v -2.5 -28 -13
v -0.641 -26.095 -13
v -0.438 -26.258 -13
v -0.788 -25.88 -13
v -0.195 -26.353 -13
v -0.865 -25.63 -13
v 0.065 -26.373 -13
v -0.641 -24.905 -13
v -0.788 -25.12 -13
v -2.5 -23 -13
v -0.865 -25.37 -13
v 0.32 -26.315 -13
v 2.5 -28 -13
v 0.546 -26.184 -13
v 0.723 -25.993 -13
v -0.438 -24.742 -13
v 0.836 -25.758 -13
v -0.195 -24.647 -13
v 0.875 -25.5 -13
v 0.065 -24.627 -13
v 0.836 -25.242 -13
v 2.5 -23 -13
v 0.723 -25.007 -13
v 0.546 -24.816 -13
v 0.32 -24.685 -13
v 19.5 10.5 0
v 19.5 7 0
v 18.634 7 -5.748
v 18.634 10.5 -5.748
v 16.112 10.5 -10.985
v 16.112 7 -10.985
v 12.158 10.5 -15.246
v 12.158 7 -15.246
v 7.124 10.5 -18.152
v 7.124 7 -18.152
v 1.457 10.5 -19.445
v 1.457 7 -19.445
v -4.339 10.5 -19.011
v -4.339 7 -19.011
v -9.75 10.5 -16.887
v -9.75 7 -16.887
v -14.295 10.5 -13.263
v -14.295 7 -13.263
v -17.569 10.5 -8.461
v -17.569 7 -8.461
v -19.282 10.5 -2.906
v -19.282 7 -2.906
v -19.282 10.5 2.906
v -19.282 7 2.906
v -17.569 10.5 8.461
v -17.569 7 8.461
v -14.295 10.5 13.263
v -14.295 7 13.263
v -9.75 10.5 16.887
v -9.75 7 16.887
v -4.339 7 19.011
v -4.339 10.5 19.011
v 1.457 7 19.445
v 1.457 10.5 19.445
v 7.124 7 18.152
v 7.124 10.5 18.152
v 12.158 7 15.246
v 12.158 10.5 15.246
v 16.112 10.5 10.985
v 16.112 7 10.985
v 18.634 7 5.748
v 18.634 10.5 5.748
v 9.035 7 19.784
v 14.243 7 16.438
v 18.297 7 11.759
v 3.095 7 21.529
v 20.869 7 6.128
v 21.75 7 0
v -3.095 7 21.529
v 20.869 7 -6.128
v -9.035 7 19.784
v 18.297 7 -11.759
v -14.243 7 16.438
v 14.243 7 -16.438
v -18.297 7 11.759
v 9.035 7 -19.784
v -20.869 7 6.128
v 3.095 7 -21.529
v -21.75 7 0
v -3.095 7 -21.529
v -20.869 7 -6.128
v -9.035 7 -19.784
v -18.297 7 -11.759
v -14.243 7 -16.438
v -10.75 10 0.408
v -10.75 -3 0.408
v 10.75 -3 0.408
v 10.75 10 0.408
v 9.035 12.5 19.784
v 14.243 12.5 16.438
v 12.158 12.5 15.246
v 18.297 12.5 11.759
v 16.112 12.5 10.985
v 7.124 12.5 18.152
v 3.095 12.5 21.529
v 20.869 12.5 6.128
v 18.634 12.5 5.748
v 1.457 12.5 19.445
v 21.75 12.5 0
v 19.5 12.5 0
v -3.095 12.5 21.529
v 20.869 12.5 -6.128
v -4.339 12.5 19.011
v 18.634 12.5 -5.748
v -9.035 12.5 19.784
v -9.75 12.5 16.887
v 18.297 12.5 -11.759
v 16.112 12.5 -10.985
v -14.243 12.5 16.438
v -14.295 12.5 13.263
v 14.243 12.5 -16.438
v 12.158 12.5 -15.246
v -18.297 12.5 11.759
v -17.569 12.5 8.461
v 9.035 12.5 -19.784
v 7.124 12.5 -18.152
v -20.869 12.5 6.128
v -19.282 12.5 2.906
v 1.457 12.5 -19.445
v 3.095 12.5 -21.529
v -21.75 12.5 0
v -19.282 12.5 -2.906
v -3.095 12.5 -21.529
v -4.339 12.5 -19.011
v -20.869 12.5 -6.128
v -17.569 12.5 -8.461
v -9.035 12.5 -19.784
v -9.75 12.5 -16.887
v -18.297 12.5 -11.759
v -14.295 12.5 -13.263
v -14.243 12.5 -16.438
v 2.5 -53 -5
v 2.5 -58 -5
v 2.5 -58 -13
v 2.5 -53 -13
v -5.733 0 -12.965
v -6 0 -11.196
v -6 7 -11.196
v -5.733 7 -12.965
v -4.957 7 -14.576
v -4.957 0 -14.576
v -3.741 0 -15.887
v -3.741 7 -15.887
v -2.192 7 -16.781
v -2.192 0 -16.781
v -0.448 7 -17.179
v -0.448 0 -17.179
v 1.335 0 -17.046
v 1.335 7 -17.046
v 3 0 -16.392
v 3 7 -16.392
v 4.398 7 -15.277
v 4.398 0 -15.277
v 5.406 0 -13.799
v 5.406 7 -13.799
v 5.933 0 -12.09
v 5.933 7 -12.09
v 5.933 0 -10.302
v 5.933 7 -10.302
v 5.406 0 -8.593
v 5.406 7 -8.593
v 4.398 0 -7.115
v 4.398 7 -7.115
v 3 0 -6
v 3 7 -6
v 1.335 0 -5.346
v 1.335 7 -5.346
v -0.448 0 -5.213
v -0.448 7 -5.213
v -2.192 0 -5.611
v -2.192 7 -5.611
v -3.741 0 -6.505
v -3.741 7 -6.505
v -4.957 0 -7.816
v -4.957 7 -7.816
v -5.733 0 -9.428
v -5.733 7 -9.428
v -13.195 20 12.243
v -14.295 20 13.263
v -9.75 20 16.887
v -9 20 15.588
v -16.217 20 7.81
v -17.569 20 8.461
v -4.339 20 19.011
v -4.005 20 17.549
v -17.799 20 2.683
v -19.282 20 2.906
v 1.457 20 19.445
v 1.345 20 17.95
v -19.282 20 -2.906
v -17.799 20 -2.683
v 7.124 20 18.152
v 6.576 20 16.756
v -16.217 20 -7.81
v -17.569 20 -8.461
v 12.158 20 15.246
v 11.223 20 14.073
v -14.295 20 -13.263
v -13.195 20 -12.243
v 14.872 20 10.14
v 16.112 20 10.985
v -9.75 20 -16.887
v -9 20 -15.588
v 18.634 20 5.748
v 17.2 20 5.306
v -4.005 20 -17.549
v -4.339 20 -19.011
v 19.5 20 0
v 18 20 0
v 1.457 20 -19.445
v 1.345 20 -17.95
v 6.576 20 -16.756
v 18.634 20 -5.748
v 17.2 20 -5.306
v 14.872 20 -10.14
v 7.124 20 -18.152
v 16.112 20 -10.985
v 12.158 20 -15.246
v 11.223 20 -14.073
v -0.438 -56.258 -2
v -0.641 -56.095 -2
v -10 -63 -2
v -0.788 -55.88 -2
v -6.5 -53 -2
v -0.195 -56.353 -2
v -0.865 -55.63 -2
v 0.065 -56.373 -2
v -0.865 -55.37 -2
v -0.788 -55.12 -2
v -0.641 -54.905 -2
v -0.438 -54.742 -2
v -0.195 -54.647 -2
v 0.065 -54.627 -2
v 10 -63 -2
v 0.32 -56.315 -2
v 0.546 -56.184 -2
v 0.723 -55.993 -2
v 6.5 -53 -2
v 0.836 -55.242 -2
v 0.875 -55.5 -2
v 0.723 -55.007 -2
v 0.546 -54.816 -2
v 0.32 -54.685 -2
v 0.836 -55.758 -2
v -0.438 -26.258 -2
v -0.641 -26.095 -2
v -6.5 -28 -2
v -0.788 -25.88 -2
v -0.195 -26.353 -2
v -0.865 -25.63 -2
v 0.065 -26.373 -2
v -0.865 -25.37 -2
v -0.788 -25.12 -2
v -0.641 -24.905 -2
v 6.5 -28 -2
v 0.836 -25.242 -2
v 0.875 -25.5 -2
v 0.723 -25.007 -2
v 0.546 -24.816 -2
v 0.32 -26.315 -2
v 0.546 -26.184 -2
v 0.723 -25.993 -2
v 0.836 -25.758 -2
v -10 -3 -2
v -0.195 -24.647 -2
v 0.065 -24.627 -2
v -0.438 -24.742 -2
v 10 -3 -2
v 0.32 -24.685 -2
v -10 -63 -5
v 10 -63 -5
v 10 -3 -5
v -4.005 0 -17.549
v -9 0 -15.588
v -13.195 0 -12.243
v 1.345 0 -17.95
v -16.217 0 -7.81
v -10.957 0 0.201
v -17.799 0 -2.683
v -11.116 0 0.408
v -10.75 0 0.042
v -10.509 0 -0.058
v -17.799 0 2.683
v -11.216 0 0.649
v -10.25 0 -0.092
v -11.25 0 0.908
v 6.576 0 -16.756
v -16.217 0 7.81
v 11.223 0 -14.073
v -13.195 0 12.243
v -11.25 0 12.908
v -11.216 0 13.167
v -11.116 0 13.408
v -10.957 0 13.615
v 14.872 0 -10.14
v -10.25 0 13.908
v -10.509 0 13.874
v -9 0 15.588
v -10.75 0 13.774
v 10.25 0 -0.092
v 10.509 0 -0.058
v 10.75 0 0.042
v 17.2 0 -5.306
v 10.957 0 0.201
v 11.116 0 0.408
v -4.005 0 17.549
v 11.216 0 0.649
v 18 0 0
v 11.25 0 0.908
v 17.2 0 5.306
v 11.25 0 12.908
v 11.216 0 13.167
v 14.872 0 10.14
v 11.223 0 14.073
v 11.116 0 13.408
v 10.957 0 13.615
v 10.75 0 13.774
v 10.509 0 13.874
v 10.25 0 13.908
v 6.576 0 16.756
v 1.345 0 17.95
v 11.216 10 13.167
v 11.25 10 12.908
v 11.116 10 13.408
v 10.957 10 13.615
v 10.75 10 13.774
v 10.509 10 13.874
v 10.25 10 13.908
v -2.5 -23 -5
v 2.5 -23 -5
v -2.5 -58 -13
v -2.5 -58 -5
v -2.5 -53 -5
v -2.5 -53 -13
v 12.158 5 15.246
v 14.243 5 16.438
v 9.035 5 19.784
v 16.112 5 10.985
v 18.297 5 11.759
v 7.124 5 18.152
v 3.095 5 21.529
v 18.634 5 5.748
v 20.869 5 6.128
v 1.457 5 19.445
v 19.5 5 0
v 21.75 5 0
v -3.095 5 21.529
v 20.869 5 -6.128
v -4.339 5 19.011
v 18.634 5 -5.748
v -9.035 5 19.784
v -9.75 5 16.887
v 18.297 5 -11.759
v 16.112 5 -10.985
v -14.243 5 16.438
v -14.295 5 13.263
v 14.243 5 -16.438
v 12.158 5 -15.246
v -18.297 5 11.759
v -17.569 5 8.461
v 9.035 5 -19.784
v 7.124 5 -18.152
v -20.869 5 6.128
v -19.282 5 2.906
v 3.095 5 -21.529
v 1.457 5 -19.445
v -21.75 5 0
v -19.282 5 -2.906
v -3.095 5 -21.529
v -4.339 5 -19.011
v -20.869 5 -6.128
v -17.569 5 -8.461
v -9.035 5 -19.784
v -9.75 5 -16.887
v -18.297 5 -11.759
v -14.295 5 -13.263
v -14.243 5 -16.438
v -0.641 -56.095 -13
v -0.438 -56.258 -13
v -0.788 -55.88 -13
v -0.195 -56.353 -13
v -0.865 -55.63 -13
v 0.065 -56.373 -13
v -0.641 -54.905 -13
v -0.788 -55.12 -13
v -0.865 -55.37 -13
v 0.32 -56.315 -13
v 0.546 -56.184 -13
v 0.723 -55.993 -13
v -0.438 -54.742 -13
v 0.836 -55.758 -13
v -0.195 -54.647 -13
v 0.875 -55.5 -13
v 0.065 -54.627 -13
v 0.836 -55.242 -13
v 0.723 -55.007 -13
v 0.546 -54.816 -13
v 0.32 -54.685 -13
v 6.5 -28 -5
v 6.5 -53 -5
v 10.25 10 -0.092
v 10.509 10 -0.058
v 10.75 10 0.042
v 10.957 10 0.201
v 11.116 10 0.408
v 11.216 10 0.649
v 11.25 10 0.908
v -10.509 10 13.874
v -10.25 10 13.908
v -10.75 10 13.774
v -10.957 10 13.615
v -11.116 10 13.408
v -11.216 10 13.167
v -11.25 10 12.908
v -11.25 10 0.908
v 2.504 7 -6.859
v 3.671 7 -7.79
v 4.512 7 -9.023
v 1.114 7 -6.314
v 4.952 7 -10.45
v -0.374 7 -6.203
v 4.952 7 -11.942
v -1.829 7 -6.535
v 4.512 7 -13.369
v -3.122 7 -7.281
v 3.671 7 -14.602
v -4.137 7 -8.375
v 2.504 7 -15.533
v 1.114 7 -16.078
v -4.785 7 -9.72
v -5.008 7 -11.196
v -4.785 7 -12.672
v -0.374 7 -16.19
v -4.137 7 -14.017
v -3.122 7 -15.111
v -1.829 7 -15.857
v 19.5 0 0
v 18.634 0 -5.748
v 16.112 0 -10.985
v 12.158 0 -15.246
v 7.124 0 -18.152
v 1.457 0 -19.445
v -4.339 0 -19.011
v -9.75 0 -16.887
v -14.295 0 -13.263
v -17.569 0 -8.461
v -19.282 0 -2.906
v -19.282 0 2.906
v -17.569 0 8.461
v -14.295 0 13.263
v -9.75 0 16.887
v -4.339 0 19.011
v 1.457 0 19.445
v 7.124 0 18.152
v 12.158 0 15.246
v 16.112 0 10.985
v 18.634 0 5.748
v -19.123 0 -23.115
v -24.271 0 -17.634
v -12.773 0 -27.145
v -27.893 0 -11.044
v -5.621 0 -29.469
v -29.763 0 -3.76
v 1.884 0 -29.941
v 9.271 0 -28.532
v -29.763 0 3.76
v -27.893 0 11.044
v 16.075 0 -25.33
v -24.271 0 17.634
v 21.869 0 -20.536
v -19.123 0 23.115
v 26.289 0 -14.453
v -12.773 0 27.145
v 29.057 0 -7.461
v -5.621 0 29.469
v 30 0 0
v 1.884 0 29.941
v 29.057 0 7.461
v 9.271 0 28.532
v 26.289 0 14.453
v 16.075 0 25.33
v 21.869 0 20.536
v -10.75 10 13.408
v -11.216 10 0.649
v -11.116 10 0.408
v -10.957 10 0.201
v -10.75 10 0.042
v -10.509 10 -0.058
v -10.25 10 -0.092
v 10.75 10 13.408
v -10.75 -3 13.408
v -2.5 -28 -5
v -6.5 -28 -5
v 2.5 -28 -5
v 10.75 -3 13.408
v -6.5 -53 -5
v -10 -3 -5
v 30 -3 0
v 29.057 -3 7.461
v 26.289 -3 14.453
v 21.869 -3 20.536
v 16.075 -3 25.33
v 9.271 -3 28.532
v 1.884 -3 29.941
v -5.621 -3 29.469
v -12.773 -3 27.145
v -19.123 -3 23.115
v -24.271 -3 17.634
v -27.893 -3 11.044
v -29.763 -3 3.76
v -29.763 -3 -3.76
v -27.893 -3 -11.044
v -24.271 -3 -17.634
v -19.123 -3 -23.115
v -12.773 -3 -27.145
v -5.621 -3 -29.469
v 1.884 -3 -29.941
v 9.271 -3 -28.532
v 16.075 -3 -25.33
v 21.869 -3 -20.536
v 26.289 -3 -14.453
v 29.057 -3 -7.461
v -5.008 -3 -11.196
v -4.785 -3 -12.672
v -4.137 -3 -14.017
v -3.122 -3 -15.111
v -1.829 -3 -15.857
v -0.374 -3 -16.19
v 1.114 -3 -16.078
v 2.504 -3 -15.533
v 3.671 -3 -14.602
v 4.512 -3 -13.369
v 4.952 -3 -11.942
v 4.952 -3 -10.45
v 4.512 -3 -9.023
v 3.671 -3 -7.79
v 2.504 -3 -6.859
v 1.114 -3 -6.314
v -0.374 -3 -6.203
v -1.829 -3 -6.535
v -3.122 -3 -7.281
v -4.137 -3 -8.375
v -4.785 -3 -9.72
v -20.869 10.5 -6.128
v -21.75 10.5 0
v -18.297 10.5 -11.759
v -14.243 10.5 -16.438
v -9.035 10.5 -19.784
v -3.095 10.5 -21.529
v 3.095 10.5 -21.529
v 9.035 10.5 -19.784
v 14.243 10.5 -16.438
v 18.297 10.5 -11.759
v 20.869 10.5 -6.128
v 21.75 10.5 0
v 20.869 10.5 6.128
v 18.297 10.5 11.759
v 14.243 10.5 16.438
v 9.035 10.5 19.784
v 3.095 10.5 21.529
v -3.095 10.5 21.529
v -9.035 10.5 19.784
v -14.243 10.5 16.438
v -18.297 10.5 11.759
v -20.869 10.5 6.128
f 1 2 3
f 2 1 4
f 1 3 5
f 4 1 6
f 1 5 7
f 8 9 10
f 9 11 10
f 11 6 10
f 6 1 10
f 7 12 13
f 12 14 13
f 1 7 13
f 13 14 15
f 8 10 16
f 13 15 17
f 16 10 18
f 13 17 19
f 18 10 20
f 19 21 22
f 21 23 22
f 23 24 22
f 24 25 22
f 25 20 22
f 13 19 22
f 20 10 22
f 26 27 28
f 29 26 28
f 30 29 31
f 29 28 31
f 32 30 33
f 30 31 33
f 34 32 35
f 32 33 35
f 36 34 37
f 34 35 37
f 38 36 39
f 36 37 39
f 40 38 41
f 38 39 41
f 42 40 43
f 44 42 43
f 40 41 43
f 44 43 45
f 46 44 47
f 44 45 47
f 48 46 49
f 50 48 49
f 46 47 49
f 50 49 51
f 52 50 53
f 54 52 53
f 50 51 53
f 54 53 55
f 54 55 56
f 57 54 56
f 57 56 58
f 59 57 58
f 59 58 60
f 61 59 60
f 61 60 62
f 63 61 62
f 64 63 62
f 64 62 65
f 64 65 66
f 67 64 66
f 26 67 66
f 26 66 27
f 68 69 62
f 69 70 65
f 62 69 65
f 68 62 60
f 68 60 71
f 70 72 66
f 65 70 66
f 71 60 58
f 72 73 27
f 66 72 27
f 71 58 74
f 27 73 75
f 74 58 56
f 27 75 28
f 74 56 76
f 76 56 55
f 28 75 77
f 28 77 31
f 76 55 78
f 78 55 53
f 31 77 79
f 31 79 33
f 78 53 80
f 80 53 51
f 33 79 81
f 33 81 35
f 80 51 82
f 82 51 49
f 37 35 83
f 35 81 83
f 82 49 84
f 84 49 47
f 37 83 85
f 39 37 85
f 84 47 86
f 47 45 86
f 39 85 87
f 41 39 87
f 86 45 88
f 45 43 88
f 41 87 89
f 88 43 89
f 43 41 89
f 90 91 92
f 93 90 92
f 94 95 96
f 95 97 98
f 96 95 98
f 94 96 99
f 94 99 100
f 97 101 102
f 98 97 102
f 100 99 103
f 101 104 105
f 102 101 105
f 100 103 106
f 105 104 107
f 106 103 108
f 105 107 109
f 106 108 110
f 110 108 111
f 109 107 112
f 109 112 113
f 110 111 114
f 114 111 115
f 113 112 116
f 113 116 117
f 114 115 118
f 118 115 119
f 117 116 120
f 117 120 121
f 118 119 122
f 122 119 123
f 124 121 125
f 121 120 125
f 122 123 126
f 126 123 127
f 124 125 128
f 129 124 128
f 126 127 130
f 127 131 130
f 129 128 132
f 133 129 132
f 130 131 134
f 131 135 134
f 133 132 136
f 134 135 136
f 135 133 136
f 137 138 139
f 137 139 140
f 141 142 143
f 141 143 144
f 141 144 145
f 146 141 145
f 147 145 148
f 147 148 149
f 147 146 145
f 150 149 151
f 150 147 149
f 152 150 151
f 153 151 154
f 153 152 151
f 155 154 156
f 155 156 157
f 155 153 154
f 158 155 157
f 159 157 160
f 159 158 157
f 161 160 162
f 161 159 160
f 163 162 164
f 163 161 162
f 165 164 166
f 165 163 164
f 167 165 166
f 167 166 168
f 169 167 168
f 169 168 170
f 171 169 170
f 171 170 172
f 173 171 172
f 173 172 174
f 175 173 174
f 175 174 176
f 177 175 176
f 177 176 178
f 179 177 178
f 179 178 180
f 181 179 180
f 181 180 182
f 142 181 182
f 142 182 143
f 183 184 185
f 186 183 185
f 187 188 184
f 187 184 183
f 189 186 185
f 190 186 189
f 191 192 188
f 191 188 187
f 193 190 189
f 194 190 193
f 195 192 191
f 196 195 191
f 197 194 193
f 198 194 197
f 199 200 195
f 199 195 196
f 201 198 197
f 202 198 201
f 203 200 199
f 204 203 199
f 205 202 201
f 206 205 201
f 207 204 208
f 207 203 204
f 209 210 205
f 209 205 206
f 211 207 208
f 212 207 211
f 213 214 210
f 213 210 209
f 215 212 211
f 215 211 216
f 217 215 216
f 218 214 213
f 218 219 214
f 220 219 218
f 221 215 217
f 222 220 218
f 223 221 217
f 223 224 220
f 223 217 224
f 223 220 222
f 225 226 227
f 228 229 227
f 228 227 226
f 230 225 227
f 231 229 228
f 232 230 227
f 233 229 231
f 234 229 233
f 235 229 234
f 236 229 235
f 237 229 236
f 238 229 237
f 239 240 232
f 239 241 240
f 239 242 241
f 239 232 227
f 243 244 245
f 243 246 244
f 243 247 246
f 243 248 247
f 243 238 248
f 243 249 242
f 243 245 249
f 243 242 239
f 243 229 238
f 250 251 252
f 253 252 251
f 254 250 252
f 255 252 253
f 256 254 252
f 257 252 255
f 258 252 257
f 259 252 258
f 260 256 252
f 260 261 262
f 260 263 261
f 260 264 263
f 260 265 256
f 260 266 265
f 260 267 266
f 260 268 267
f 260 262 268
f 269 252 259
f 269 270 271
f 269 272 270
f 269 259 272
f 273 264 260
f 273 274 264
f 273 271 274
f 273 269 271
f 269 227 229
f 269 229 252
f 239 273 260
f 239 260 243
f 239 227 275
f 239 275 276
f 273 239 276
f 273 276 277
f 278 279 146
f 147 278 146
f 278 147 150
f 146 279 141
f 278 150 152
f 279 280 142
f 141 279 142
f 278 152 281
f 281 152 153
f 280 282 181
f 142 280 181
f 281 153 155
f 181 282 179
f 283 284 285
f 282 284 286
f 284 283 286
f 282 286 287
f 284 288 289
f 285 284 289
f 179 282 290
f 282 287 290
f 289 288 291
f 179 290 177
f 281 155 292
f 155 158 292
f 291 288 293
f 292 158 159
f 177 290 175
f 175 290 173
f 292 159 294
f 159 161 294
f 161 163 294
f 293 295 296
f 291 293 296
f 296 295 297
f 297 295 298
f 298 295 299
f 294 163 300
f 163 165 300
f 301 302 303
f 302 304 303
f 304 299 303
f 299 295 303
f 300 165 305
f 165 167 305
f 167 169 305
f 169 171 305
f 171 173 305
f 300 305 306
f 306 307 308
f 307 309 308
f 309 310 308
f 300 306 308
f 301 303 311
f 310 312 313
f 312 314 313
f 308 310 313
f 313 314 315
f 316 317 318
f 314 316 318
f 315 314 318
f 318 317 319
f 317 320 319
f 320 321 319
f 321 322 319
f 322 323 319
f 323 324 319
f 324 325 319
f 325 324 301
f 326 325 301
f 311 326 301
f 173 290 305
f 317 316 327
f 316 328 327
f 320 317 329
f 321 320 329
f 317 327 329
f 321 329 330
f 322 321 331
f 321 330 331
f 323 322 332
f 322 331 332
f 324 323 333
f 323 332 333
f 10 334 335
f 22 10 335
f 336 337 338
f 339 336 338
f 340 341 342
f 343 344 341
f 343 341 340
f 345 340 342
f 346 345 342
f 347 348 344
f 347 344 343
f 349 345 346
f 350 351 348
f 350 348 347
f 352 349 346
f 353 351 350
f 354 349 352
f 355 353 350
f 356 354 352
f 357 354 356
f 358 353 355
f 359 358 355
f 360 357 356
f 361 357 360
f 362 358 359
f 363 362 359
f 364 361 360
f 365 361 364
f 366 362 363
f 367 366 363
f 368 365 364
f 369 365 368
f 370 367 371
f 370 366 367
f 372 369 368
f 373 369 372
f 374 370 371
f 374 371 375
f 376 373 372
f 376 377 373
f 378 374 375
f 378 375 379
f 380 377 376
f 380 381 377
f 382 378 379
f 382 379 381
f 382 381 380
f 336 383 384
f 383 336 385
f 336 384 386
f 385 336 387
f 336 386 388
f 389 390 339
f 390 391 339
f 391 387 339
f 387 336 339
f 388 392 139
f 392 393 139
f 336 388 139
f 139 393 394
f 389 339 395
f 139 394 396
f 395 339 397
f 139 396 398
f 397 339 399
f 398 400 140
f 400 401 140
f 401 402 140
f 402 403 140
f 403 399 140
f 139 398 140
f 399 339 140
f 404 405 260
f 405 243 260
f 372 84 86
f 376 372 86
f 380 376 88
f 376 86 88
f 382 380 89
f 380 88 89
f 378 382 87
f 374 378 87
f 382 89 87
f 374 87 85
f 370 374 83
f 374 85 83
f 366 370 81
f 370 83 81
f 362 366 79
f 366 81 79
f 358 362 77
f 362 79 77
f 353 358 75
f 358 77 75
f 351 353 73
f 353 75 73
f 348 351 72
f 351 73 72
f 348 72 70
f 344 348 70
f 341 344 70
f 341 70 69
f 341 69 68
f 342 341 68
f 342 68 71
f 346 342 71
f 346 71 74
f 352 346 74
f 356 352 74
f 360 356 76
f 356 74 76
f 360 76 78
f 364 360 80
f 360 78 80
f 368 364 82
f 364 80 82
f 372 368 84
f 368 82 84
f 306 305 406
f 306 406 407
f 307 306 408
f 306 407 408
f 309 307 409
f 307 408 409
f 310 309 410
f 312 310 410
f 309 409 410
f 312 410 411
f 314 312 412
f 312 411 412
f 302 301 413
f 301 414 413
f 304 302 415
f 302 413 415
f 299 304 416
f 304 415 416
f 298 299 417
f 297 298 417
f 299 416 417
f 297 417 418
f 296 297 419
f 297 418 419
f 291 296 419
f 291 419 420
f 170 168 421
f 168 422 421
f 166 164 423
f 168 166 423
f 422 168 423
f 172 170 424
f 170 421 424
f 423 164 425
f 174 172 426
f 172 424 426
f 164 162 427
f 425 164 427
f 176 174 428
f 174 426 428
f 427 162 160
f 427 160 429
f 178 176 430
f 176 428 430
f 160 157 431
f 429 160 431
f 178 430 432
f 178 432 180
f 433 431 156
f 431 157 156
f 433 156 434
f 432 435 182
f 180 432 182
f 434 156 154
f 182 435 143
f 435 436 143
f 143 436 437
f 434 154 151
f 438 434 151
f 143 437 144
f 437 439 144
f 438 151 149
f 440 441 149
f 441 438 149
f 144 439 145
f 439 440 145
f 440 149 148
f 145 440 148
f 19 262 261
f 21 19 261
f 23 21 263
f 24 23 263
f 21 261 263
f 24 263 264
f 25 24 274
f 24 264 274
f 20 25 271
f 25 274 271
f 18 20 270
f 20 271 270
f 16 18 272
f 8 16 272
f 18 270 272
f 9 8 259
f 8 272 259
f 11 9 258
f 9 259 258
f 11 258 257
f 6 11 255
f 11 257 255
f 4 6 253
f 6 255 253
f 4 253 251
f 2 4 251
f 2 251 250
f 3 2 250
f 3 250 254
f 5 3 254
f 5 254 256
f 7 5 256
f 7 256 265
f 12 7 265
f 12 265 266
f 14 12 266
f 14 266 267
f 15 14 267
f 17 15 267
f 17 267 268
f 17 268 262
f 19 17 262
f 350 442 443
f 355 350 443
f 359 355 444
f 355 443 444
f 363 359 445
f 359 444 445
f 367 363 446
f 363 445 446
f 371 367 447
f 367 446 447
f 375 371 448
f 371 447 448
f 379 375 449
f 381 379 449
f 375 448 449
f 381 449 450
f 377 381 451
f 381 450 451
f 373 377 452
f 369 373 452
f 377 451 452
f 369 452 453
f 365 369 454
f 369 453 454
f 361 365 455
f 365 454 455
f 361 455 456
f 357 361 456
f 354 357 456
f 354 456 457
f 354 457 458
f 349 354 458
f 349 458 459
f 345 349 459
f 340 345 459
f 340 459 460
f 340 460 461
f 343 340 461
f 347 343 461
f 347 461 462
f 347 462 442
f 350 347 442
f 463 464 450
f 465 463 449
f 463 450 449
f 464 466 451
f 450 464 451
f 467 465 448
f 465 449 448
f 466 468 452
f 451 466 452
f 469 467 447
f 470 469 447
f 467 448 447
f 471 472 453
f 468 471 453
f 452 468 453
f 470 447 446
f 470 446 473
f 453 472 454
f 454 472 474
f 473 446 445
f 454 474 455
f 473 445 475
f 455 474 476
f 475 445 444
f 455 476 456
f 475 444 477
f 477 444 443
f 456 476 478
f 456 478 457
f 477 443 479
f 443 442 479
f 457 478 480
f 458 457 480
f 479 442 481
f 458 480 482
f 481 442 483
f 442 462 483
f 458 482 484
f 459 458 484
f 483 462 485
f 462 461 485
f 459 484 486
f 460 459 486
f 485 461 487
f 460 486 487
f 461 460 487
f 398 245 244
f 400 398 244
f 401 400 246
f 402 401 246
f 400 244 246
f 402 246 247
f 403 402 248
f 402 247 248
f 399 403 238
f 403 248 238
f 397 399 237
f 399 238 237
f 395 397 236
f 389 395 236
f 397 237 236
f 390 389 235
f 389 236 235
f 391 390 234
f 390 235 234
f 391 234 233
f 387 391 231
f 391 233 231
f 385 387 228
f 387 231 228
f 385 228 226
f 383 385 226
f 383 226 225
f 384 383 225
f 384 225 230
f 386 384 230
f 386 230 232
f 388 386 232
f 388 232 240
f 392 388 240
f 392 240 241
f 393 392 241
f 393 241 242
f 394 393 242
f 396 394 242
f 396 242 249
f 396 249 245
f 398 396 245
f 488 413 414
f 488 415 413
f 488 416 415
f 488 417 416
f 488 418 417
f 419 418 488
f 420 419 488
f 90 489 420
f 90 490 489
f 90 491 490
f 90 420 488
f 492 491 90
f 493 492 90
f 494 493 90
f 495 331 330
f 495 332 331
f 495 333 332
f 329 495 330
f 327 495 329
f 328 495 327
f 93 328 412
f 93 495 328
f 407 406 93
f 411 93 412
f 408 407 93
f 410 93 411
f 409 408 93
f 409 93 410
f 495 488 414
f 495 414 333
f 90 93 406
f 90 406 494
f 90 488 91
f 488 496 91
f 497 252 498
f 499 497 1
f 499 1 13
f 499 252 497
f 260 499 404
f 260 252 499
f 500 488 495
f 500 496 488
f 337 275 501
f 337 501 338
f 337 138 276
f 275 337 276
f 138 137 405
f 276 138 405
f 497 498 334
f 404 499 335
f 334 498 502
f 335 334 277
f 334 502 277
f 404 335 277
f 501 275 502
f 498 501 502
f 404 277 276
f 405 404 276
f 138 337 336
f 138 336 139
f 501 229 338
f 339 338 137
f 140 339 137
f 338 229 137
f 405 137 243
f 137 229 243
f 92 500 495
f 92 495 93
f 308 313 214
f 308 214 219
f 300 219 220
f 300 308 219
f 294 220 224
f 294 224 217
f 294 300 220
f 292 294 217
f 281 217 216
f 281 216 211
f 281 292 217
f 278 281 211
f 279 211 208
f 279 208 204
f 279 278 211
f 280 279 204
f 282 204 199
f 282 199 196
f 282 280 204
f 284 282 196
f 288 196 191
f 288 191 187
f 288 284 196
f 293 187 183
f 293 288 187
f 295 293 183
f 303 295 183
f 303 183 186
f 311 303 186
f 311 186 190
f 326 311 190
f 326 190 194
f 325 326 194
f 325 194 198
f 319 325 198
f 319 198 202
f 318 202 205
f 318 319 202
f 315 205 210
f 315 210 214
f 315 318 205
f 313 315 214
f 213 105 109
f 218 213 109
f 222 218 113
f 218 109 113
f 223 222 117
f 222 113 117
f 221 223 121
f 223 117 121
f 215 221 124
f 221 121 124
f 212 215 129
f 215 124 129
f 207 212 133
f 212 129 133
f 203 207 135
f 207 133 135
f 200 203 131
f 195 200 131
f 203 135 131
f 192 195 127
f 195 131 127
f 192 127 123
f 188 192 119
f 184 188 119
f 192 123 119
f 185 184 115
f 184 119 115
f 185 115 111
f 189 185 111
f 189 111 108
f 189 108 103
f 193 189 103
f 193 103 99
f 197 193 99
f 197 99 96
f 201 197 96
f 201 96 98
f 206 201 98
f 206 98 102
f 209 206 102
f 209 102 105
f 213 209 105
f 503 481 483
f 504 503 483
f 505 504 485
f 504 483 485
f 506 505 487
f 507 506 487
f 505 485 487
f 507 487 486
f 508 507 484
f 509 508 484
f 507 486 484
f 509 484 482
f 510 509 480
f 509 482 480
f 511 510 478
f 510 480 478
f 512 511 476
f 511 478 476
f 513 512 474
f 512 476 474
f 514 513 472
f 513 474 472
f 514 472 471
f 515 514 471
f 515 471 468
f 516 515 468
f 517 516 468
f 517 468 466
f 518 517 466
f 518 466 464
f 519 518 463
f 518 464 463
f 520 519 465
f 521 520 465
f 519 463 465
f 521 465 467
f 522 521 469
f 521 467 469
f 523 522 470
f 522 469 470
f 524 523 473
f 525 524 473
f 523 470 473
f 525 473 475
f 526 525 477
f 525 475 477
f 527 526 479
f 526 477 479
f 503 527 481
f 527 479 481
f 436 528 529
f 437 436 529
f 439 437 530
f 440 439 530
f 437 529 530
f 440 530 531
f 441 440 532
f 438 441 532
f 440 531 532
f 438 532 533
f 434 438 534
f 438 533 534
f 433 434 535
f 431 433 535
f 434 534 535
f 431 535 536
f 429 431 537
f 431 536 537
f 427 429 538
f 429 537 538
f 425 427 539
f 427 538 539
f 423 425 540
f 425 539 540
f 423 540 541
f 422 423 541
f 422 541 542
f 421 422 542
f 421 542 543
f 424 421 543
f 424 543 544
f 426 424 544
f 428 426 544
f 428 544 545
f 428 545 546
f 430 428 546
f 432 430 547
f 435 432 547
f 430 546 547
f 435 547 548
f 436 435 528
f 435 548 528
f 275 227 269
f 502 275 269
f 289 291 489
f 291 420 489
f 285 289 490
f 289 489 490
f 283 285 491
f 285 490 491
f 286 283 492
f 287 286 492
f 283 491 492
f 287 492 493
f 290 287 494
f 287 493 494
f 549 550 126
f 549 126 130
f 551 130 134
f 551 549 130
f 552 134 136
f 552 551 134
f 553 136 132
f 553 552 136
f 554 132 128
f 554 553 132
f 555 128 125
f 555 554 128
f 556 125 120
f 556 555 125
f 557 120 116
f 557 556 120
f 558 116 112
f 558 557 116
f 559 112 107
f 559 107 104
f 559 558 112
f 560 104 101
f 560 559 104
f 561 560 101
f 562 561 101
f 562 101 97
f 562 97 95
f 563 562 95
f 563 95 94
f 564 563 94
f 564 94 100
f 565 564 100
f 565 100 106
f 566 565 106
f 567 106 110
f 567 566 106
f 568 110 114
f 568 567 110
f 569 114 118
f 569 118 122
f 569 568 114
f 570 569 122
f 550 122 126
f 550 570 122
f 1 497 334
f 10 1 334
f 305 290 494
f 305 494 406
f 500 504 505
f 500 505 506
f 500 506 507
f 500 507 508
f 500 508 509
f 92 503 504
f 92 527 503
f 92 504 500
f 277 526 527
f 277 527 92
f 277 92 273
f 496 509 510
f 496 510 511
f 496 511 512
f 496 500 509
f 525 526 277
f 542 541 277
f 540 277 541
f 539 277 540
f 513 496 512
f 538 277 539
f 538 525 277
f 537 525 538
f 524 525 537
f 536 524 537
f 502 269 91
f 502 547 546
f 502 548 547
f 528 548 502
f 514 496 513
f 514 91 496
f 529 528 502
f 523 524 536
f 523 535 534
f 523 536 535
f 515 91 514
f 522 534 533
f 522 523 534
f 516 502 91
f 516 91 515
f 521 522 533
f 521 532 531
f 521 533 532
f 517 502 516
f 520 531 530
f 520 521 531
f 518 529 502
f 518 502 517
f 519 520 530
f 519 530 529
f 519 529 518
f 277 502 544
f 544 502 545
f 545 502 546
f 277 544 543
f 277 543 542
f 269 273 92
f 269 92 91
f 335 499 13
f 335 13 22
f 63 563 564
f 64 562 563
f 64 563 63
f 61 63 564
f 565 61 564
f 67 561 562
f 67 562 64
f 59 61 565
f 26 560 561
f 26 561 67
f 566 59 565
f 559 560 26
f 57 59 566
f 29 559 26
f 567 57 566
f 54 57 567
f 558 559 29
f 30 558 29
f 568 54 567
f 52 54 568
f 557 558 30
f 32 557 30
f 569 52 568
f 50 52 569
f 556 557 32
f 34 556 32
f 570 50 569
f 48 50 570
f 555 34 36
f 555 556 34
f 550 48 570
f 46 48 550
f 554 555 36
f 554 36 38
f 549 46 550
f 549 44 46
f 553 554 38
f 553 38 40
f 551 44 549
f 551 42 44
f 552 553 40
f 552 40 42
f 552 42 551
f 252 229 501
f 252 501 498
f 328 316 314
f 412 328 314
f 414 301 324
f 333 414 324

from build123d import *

# Parameters (mm, degrees)
SKETCH_1_R               = 19.5
SKETCH_1_R_2             = 18
EXTRUDE_1_DEPTH          = 20
SKETCH_3_R               = 30
EXTRUDE_2_DEPTH          = 3
SKETCH_10_R              = 6
SKETCH_10_R_2            = 5
EXTRUDE_6_DEPTH          = 10
SKETCH_11_R              = 5.007506695
CUT_EXTRUDE_4_DEPTH      = 19
CUT_EXTRUDE_4_DEPTH_BACK = 10
SKETCH_15_W              = 20
SKETCH_15_H              = 60
SKETCH_15_W_2            = 13
SKETCH_15_H_2            = 25
EXTRUDE_7_DEPTH          = 1
EXTRUDE_7_DEPTH_BACK     = 2
SKETCH_16_W              = 5
SKETCH_16_H              = 5
EXTRUDE_8_DEPTH          = 10
SKETCH_18_R              = 0.875
CUT_EXTRUDE_5_DEPTH      = 10
CUT_EXTRUDE_5_DEPTH_BACK = 39
SKETCH_12_W              = 21.5
SKETCH_12_H              = 13
CUT_EXTRUDE_6_DEPTH      = 21.5
SKETCH_19_W              = 22.5
SKETCH_19_H              = 14
SKETCH_19_W_2            = 21.5
SKETCH_19_H_2            = 13
EXTRUDE_9_DEPTH          = 10
FILLET_2_R               = 1
FILLET_3_R               = 1
FILLET_4_R               = 1
FILLET_5_R               = 1
SKETCH_25_R              = 21.75
SKETCH_25_R_2            = 19.5
EXTRUDE_12_DEPTH         = 2
SKETCH_26_R              = 21.75
SKETCH_26_R_2            = 19.5
EXTRUDE_13_DEPTH         = 2


with BuildPart() as part:
    # 草圖1 → 填料-伸長1 (new body)
    with BuildSketch(Plane(origin=(0, 0, 0), x_dir=(1, 0, 0), z_dir=(0, 1, 0))):
        Circle(SKETCH_1_R)
        Circle(SKETCH_1_R_2, mode=Mode.SUBTRACT)
    extrude(amount=EXTRUDE_1_DEPTH)

    # 草圖3 → 填料-伸長2 (add)
    with BuildSketch(Plane.XZ):
        Circle(SKETCH_3_R)
    extrude(amount=EXTRUDE_2_DEPTH)

    # 草圖10 → 填料-伸長6 (add)
    with BuildSketch(Plane(origin=(0, -3, 0), x_dir=(-1, 0, 0), z_dir=(0, -1, 0))):
        with Locations((0, 11.196036894)):
            Circle(SKETCH_10_R)
        with Locations((0, 11.196036894)):
            Circle(SKETCH_10_R_2, mode=Mode.SUBTRACT)
    extrude(amount=-EXTRUDE_6_DEPTH)

    # 草圖11 → 除料-伸長4 (cut, two sides)
    with BuildSketch(Plane(origin=(0, -3, 0), x_dir=(-1, 0, 0), z_dir=(0, -1, 0))) as cut_extrude_4_sk:
        with Locations((0, 11.196036894)):
            Circle(SKETCH_11_R)
    extrude(amount=CUT_EXTRUDE_4_DEPTH, mode=Mode.SUBTRACT)
    extrude(cut_extrude_4_sk.sketch, amount=-CUT_EXTRUDE_4_DEPTH_BACK, mode=Mode.SUBTRACT)

    # 草圖15 → 填料-伸長7 (add, two sides)
    with BuildSketch(Plane.XY.offset(-3)) as extrude_7_sk:
        with Locations((0, -33)):
            Rectangle(SKETCH_15_W, SKETCH_15_H)
        with Locations((0, -40.5)):
            Rectangle(SKETCH_15_W_2, SKETCH_15_H_2, mode=Mode.SUBTRACT)
    extrude(amount=EXTRUDE_7_DEPTH)
    extrude(extrude_7_sk.sketch, amount=-EXTRUDE_7_DEPTH_BACK)

    # 草圖16 → 填料-伸長8 (add)
    with BuildSketch(Plane.XY.offset(-3)):
        with Locations((0, -25.5)):
            Rectangle(SKETCH_16_W, SKETCH_16_H)
        with Locations((0, -55.5)):
            Rectangle(SKETCH_16_W, SKETCH_16_H)
    extrude(amount=-EXTRUDE_8_DEPTH)

    # 草圖18 → 除料-伸長5 (cut, two sides)
    with BuildSketch(Plane.XY) as cut_extrude_5_sk:
        with Locations((0, -55.5)):
            Circle(SKETCH_18_R)
        with Locations((0, -25.5)):
            Circle(SKETCH_18_R)
    extrude(amount=CUT_EXTRUDE_5_DEPTH, mode=Mode.SUBTRACT)
    extrude(cut_extrude_5_sk.sketch, amount=-CUT_EXTRUDE_5_DEPTH_BACK, mode=Mode.SUBTRACT)

    # 草圖12 → 除料-伸長6 (cut)
    with BuildSketch(Plane.XZ.offset(3)):
        with Locations((0, 6.907998134)):
            Rectangle(SKETCH_12_W, SKETCH_12_H)
    extrude(amount=-CUT_EXTRUDE_6_DEPTH, mode=Mode.SUBTRACT)

    # 草圖19 → 填料-伸長9 (add)
    with BuildSketch(Plane(origin=(0, 0, 0), x_dir=(1, 0, 0), z_dir=(0, 1, 0))):
        with Locations((0, -6.907998134)):
            Rectangle(SKETCH_19_W, SKETCH_19_H)
        with Locations((0, -6.907998134)):
            Rectangle(SKETCH_19_W_2, SKETCH_19_H_2, mode=Mode.SUBTRACT)
    extrude(amount=EXTRUDE_9_DEPTH)

    # 圓角2
    fillet_2_edges = [part.edges().sort_by_distance(p)[0] for p in [
        (-11.25, 5, -0.092001866),
    ]]
    fillet(fillet_2_edges, radius=FILLET_2_R)

    # 圓角3
    fillet_3_edges = [part.edges().sort_by_distance(p)[0] for p in [
        (11.25, 5, -0.092001866),
    ]]
    fillet(fillet_3_edges, radius=FILLET_3_R)

    # 圓角4
    fillet_4_edges = [part.edges().sort_by_distance(p)[0] for p in [
        (11.25, 5, 13.907998134),
    ]]
    fillet(fillet_4_edges, radius=FILLET_4_R)

    # 圓角5
    fillet_5_edges = [part.edges().sort_by_distance(p)[0] for p in [
        (-11.25, 5, 13.907998134),
    ]]
    fillet(fillet_5_edges, radius=FILLET_5_R)

    # 草圖25 → 填料-伸長12 (add)
    with BuildSketch(Plane(origin=(0, 7, 0), x_dir=(-1, 0, 0), z_dir=(0, -1, 0))):
        Circle(SKETCH_25_R)
        Circle(SKETCH_25_R_2, mode=Mode.SUBTRACT)
    extrude(amount=EXTRUDE_12_DEPTH)

    # 草圖26 → 填料-伸長13 (add)
    with BuildSketch(Plane(origin=(0, 10.5, 0), x_dir=(-1, 0, 0), z_dir=(0, -1, 0))):
        Circle(SKETCH_26_R)
        Circle(SKETCH_26_R_2, mode=Mode.SUBTRACT)
    extrude(amount=-EXTRUDE_13_DEPTH)


solid = part.part
